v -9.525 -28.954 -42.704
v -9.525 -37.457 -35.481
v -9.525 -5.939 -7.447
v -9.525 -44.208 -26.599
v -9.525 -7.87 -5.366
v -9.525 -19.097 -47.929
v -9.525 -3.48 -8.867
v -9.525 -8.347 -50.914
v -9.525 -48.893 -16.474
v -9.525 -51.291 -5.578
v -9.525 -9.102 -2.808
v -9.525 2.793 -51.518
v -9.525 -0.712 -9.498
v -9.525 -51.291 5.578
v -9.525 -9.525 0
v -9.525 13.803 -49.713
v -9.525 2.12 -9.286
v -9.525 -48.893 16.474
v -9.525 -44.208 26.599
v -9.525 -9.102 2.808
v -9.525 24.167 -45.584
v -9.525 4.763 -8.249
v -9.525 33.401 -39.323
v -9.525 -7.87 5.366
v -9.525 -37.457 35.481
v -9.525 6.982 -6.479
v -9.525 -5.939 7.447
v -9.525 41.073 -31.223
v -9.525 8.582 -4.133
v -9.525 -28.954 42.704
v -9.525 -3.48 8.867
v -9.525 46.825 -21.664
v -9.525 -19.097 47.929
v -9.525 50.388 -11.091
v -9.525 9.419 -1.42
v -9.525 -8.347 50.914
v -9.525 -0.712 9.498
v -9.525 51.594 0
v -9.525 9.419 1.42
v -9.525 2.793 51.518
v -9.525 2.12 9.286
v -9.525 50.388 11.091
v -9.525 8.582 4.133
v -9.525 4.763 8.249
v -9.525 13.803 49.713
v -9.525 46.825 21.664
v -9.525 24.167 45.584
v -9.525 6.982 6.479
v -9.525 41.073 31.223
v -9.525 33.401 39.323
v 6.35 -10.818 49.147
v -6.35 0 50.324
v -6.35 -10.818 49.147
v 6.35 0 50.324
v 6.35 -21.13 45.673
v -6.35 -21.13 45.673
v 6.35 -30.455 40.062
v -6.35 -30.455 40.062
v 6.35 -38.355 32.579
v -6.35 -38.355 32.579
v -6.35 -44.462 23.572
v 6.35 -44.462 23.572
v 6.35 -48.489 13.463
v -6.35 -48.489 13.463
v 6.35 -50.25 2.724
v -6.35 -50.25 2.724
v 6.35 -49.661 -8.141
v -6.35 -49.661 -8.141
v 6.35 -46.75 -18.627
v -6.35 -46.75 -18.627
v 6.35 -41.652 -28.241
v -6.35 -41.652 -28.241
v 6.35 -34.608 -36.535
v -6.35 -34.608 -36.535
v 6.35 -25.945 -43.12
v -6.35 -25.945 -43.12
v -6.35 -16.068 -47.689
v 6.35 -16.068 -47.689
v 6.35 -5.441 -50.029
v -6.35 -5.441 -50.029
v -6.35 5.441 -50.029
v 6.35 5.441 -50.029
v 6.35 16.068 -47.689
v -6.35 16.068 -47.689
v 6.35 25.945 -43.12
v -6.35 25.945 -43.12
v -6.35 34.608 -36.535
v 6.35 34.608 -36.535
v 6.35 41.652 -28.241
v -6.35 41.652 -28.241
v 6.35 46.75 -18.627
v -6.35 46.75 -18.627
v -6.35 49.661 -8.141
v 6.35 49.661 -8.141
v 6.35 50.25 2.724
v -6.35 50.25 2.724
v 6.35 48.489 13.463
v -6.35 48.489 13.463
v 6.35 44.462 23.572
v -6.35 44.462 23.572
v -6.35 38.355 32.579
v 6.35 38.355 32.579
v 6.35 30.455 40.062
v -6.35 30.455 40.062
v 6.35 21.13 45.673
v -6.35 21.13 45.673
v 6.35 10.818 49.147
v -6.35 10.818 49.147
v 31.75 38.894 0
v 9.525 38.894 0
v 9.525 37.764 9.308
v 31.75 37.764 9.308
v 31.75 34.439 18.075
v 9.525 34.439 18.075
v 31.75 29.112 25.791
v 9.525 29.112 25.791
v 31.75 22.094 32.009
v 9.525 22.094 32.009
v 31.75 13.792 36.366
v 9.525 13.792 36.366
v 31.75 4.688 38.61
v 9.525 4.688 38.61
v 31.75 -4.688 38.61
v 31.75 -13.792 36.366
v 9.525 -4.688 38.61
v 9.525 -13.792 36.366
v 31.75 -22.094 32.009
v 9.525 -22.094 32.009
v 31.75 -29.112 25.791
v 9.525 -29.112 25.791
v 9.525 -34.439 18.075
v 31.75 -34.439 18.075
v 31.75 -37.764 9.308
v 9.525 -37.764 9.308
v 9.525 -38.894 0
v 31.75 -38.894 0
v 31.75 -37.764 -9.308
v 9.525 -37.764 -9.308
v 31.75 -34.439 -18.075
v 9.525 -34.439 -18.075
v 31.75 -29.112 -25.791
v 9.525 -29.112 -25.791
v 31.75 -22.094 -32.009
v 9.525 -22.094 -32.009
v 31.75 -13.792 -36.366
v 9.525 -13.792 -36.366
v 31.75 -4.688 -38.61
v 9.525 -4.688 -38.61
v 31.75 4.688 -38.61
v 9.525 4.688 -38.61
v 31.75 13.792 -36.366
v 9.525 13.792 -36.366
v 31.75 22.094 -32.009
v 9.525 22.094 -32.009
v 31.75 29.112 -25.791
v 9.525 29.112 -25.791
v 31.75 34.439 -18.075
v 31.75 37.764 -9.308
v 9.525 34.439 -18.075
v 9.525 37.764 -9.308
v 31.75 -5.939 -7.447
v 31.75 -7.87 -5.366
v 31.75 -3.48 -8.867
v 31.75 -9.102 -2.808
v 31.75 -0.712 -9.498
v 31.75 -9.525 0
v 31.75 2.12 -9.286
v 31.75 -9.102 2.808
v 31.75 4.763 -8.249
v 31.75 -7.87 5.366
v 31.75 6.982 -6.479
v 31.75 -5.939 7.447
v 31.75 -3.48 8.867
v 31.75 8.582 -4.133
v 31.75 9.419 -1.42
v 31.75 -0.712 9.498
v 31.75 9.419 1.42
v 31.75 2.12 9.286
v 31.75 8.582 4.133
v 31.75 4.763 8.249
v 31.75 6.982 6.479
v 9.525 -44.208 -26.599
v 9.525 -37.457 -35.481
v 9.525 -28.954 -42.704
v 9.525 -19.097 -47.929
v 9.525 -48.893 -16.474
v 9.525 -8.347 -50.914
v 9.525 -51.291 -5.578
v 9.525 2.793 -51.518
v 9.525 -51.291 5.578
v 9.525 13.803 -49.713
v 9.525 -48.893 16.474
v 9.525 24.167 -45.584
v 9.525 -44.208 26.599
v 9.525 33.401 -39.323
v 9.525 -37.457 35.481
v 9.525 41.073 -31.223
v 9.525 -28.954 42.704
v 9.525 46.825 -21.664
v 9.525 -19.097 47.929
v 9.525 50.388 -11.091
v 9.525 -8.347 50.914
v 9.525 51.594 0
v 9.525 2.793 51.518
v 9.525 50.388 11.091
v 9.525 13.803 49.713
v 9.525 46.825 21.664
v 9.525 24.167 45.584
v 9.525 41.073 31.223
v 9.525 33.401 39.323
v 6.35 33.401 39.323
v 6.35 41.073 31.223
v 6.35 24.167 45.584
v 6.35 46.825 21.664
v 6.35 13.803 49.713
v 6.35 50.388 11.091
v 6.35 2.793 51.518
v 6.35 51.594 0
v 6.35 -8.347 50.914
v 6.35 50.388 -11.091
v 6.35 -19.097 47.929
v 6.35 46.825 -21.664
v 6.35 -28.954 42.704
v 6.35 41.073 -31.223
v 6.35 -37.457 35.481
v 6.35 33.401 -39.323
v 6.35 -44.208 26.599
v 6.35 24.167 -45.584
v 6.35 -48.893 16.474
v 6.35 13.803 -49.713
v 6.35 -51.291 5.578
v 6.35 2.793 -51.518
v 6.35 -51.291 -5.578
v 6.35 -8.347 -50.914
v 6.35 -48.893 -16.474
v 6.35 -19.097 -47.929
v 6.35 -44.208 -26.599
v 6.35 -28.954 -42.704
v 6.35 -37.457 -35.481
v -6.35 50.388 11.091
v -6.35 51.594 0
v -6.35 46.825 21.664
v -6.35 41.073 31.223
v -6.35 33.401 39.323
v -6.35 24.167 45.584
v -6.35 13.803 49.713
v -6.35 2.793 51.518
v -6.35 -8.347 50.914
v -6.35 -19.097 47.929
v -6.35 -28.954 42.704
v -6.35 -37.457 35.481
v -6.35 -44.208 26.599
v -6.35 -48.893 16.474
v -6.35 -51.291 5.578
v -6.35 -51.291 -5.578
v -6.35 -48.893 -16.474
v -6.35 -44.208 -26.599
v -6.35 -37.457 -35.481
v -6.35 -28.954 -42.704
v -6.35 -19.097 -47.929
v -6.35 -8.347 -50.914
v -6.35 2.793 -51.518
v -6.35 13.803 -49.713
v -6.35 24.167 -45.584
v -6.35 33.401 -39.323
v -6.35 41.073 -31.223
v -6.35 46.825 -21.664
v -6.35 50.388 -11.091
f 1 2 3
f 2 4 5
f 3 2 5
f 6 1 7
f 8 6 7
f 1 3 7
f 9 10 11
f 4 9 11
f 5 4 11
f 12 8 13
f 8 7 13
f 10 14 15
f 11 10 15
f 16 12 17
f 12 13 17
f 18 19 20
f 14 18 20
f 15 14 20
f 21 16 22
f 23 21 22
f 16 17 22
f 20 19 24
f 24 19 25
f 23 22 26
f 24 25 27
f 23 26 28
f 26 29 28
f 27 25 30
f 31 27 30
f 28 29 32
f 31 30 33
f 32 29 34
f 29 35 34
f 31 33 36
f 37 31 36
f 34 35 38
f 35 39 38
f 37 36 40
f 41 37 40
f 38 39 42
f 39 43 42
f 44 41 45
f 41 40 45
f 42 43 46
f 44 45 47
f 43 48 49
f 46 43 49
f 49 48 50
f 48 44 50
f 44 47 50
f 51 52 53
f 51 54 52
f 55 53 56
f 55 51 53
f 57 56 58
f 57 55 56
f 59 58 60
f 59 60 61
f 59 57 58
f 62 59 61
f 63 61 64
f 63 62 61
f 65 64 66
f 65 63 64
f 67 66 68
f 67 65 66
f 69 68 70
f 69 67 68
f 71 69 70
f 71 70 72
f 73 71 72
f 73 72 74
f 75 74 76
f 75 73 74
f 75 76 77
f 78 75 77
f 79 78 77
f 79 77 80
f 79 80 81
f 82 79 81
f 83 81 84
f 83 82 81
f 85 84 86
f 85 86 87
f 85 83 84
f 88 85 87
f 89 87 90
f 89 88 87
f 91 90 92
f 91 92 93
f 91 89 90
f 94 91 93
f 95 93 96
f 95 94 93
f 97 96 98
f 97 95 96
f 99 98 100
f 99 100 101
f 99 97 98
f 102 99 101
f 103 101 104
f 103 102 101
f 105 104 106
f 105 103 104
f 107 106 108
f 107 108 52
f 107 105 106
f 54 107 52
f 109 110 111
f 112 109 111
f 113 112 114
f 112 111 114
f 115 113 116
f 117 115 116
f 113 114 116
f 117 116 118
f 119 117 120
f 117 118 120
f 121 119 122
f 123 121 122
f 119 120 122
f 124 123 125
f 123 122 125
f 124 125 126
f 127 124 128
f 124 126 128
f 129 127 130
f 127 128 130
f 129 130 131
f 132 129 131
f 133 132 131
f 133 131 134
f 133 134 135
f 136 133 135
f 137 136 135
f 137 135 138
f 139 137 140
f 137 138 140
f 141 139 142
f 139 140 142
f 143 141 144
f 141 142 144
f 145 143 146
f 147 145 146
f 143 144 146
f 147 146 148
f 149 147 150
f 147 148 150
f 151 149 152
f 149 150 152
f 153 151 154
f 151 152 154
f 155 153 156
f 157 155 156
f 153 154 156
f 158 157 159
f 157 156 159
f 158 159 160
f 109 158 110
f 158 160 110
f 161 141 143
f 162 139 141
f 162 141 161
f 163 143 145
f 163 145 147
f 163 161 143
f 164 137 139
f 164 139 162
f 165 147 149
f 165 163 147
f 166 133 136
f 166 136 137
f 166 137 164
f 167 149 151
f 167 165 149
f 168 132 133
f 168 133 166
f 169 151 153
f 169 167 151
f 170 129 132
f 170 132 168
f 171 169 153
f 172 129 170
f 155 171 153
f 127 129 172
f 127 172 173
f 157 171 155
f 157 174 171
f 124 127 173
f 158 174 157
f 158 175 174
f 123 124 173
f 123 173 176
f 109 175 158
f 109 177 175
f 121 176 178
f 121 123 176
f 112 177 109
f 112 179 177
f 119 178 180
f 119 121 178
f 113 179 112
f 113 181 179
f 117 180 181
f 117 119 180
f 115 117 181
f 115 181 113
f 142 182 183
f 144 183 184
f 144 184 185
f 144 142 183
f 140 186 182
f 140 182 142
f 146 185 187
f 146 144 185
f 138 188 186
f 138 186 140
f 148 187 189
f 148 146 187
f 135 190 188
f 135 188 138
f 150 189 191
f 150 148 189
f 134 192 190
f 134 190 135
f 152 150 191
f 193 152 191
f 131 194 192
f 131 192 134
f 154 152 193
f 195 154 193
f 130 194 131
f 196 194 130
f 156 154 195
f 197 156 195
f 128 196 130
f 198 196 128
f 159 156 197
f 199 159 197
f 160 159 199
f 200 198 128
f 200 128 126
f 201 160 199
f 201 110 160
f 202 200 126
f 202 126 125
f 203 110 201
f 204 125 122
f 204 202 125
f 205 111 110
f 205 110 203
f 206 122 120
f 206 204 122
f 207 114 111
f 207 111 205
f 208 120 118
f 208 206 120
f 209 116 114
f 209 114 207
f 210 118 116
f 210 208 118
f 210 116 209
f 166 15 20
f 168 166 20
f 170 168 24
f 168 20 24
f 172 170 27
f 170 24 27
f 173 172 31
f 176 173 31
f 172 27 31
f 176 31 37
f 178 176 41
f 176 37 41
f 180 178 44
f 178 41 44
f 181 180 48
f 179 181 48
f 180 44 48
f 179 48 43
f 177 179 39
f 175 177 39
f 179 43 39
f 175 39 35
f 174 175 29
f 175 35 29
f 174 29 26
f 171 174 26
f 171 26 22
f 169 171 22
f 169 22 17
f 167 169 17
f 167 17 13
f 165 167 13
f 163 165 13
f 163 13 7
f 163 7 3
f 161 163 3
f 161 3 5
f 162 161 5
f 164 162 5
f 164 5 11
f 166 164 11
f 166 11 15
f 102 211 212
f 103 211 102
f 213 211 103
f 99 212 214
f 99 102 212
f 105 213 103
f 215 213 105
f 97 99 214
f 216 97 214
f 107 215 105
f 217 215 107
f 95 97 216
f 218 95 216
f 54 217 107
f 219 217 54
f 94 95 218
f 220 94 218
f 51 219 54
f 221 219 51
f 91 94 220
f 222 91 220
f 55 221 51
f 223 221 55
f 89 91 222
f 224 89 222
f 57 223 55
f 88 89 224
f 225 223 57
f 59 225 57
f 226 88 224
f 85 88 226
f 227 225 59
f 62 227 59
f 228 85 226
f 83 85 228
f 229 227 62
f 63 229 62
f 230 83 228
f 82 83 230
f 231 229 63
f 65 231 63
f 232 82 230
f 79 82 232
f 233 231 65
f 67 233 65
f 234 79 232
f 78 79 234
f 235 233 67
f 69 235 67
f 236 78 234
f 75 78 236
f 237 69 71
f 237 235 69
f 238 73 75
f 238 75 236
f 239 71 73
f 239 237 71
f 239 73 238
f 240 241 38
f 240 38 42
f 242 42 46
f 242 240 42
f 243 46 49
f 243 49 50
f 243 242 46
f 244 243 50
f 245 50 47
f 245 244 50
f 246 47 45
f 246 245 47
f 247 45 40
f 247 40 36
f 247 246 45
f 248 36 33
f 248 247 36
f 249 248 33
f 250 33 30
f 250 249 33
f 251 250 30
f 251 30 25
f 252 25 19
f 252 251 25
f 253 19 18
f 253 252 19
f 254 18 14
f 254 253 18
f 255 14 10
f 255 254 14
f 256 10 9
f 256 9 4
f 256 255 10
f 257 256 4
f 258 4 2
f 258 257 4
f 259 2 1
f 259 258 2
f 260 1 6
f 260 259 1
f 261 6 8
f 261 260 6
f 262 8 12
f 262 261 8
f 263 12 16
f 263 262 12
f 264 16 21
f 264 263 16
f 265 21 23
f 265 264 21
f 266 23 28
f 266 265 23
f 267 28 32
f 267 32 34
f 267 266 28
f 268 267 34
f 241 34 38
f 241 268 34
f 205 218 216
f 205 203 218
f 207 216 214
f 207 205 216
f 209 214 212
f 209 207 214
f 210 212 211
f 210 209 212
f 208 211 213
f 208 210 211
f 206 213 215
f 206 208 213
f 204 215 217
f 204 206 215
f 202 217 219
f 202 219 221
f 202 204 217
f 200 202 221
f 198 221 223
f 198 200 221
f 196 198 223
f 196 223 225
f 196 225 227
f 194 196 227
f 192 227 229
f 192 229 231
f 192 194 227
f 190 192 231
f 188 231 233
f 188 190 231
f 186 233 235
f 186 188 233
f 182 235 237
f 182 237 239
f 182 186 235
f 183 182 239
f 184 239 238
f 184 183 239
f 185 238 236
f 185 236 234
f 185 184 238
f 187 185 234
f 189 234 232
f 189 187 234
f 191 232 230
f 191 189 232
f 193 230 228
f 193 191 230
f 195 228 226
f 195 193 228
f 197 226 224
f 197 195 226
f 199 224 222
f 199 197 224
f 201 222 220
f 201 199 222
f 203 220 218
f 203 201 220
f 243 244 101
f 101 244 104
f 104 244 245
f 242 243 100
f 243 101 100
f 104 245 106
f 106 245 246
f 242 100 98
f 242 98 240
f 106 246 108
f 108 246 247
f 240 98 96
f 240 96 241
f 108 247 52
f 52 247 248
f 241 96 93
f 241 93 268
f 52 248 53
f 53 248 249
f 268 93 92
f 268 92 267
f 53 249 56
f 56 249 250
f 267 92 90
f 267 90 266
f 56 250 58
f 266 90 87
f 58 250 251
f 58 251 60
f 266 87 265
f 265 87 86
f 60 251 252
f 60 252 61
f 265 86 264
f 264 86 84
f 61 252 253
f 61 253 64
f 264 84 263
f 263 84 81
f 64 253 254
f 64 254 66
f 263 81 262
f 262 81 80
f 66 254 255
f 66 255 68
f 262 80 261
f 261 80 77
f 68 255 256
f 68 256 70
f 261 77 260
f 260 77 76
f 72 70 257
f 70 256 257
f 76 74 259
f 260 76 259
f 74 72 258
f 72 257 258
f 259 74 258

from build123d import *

# Parameters (mm, degrees)
F0_R     = 51.59375
F1_DEPTH = 9.525
F2_R     = 38.89375
F3_DEPTH = 22.225
F4_W     = 12.7
F4_H     = 2.54
F7_D     = 19.05


with BuildPart() as f1:
    # F0 (on Right) → F1 (new body, symmetric)
    with BuildSketch(Plane.YZ):
        Circle(F0_R)
    extrude(amount=F1_DEPTH, both=True)

    # F2 (on face) → F3 (join)
    with BuildSketch(Plane.YZ.offset(9.525)):
        Circle(F2_R)
    extrude(amount=F3_DEPTH)

    # F4 (on Front) → F5 (revolve, cut)
    with BuildSketch(Plane.XZ):
        with Locations((0, 51.59375)):
            Rectangle(F4_W, F4_H)
    revolve(axis=Axis((1.883045, 0, 0), (1, 0, 0)), mode=Mode.SUBTRACT)

    # F7 (through all)
    with Locations(Plane.YZ.offset(31.75)):
        with Locations((0, 0)):
            Hole(F7_D / 2)


solid = f1.part
